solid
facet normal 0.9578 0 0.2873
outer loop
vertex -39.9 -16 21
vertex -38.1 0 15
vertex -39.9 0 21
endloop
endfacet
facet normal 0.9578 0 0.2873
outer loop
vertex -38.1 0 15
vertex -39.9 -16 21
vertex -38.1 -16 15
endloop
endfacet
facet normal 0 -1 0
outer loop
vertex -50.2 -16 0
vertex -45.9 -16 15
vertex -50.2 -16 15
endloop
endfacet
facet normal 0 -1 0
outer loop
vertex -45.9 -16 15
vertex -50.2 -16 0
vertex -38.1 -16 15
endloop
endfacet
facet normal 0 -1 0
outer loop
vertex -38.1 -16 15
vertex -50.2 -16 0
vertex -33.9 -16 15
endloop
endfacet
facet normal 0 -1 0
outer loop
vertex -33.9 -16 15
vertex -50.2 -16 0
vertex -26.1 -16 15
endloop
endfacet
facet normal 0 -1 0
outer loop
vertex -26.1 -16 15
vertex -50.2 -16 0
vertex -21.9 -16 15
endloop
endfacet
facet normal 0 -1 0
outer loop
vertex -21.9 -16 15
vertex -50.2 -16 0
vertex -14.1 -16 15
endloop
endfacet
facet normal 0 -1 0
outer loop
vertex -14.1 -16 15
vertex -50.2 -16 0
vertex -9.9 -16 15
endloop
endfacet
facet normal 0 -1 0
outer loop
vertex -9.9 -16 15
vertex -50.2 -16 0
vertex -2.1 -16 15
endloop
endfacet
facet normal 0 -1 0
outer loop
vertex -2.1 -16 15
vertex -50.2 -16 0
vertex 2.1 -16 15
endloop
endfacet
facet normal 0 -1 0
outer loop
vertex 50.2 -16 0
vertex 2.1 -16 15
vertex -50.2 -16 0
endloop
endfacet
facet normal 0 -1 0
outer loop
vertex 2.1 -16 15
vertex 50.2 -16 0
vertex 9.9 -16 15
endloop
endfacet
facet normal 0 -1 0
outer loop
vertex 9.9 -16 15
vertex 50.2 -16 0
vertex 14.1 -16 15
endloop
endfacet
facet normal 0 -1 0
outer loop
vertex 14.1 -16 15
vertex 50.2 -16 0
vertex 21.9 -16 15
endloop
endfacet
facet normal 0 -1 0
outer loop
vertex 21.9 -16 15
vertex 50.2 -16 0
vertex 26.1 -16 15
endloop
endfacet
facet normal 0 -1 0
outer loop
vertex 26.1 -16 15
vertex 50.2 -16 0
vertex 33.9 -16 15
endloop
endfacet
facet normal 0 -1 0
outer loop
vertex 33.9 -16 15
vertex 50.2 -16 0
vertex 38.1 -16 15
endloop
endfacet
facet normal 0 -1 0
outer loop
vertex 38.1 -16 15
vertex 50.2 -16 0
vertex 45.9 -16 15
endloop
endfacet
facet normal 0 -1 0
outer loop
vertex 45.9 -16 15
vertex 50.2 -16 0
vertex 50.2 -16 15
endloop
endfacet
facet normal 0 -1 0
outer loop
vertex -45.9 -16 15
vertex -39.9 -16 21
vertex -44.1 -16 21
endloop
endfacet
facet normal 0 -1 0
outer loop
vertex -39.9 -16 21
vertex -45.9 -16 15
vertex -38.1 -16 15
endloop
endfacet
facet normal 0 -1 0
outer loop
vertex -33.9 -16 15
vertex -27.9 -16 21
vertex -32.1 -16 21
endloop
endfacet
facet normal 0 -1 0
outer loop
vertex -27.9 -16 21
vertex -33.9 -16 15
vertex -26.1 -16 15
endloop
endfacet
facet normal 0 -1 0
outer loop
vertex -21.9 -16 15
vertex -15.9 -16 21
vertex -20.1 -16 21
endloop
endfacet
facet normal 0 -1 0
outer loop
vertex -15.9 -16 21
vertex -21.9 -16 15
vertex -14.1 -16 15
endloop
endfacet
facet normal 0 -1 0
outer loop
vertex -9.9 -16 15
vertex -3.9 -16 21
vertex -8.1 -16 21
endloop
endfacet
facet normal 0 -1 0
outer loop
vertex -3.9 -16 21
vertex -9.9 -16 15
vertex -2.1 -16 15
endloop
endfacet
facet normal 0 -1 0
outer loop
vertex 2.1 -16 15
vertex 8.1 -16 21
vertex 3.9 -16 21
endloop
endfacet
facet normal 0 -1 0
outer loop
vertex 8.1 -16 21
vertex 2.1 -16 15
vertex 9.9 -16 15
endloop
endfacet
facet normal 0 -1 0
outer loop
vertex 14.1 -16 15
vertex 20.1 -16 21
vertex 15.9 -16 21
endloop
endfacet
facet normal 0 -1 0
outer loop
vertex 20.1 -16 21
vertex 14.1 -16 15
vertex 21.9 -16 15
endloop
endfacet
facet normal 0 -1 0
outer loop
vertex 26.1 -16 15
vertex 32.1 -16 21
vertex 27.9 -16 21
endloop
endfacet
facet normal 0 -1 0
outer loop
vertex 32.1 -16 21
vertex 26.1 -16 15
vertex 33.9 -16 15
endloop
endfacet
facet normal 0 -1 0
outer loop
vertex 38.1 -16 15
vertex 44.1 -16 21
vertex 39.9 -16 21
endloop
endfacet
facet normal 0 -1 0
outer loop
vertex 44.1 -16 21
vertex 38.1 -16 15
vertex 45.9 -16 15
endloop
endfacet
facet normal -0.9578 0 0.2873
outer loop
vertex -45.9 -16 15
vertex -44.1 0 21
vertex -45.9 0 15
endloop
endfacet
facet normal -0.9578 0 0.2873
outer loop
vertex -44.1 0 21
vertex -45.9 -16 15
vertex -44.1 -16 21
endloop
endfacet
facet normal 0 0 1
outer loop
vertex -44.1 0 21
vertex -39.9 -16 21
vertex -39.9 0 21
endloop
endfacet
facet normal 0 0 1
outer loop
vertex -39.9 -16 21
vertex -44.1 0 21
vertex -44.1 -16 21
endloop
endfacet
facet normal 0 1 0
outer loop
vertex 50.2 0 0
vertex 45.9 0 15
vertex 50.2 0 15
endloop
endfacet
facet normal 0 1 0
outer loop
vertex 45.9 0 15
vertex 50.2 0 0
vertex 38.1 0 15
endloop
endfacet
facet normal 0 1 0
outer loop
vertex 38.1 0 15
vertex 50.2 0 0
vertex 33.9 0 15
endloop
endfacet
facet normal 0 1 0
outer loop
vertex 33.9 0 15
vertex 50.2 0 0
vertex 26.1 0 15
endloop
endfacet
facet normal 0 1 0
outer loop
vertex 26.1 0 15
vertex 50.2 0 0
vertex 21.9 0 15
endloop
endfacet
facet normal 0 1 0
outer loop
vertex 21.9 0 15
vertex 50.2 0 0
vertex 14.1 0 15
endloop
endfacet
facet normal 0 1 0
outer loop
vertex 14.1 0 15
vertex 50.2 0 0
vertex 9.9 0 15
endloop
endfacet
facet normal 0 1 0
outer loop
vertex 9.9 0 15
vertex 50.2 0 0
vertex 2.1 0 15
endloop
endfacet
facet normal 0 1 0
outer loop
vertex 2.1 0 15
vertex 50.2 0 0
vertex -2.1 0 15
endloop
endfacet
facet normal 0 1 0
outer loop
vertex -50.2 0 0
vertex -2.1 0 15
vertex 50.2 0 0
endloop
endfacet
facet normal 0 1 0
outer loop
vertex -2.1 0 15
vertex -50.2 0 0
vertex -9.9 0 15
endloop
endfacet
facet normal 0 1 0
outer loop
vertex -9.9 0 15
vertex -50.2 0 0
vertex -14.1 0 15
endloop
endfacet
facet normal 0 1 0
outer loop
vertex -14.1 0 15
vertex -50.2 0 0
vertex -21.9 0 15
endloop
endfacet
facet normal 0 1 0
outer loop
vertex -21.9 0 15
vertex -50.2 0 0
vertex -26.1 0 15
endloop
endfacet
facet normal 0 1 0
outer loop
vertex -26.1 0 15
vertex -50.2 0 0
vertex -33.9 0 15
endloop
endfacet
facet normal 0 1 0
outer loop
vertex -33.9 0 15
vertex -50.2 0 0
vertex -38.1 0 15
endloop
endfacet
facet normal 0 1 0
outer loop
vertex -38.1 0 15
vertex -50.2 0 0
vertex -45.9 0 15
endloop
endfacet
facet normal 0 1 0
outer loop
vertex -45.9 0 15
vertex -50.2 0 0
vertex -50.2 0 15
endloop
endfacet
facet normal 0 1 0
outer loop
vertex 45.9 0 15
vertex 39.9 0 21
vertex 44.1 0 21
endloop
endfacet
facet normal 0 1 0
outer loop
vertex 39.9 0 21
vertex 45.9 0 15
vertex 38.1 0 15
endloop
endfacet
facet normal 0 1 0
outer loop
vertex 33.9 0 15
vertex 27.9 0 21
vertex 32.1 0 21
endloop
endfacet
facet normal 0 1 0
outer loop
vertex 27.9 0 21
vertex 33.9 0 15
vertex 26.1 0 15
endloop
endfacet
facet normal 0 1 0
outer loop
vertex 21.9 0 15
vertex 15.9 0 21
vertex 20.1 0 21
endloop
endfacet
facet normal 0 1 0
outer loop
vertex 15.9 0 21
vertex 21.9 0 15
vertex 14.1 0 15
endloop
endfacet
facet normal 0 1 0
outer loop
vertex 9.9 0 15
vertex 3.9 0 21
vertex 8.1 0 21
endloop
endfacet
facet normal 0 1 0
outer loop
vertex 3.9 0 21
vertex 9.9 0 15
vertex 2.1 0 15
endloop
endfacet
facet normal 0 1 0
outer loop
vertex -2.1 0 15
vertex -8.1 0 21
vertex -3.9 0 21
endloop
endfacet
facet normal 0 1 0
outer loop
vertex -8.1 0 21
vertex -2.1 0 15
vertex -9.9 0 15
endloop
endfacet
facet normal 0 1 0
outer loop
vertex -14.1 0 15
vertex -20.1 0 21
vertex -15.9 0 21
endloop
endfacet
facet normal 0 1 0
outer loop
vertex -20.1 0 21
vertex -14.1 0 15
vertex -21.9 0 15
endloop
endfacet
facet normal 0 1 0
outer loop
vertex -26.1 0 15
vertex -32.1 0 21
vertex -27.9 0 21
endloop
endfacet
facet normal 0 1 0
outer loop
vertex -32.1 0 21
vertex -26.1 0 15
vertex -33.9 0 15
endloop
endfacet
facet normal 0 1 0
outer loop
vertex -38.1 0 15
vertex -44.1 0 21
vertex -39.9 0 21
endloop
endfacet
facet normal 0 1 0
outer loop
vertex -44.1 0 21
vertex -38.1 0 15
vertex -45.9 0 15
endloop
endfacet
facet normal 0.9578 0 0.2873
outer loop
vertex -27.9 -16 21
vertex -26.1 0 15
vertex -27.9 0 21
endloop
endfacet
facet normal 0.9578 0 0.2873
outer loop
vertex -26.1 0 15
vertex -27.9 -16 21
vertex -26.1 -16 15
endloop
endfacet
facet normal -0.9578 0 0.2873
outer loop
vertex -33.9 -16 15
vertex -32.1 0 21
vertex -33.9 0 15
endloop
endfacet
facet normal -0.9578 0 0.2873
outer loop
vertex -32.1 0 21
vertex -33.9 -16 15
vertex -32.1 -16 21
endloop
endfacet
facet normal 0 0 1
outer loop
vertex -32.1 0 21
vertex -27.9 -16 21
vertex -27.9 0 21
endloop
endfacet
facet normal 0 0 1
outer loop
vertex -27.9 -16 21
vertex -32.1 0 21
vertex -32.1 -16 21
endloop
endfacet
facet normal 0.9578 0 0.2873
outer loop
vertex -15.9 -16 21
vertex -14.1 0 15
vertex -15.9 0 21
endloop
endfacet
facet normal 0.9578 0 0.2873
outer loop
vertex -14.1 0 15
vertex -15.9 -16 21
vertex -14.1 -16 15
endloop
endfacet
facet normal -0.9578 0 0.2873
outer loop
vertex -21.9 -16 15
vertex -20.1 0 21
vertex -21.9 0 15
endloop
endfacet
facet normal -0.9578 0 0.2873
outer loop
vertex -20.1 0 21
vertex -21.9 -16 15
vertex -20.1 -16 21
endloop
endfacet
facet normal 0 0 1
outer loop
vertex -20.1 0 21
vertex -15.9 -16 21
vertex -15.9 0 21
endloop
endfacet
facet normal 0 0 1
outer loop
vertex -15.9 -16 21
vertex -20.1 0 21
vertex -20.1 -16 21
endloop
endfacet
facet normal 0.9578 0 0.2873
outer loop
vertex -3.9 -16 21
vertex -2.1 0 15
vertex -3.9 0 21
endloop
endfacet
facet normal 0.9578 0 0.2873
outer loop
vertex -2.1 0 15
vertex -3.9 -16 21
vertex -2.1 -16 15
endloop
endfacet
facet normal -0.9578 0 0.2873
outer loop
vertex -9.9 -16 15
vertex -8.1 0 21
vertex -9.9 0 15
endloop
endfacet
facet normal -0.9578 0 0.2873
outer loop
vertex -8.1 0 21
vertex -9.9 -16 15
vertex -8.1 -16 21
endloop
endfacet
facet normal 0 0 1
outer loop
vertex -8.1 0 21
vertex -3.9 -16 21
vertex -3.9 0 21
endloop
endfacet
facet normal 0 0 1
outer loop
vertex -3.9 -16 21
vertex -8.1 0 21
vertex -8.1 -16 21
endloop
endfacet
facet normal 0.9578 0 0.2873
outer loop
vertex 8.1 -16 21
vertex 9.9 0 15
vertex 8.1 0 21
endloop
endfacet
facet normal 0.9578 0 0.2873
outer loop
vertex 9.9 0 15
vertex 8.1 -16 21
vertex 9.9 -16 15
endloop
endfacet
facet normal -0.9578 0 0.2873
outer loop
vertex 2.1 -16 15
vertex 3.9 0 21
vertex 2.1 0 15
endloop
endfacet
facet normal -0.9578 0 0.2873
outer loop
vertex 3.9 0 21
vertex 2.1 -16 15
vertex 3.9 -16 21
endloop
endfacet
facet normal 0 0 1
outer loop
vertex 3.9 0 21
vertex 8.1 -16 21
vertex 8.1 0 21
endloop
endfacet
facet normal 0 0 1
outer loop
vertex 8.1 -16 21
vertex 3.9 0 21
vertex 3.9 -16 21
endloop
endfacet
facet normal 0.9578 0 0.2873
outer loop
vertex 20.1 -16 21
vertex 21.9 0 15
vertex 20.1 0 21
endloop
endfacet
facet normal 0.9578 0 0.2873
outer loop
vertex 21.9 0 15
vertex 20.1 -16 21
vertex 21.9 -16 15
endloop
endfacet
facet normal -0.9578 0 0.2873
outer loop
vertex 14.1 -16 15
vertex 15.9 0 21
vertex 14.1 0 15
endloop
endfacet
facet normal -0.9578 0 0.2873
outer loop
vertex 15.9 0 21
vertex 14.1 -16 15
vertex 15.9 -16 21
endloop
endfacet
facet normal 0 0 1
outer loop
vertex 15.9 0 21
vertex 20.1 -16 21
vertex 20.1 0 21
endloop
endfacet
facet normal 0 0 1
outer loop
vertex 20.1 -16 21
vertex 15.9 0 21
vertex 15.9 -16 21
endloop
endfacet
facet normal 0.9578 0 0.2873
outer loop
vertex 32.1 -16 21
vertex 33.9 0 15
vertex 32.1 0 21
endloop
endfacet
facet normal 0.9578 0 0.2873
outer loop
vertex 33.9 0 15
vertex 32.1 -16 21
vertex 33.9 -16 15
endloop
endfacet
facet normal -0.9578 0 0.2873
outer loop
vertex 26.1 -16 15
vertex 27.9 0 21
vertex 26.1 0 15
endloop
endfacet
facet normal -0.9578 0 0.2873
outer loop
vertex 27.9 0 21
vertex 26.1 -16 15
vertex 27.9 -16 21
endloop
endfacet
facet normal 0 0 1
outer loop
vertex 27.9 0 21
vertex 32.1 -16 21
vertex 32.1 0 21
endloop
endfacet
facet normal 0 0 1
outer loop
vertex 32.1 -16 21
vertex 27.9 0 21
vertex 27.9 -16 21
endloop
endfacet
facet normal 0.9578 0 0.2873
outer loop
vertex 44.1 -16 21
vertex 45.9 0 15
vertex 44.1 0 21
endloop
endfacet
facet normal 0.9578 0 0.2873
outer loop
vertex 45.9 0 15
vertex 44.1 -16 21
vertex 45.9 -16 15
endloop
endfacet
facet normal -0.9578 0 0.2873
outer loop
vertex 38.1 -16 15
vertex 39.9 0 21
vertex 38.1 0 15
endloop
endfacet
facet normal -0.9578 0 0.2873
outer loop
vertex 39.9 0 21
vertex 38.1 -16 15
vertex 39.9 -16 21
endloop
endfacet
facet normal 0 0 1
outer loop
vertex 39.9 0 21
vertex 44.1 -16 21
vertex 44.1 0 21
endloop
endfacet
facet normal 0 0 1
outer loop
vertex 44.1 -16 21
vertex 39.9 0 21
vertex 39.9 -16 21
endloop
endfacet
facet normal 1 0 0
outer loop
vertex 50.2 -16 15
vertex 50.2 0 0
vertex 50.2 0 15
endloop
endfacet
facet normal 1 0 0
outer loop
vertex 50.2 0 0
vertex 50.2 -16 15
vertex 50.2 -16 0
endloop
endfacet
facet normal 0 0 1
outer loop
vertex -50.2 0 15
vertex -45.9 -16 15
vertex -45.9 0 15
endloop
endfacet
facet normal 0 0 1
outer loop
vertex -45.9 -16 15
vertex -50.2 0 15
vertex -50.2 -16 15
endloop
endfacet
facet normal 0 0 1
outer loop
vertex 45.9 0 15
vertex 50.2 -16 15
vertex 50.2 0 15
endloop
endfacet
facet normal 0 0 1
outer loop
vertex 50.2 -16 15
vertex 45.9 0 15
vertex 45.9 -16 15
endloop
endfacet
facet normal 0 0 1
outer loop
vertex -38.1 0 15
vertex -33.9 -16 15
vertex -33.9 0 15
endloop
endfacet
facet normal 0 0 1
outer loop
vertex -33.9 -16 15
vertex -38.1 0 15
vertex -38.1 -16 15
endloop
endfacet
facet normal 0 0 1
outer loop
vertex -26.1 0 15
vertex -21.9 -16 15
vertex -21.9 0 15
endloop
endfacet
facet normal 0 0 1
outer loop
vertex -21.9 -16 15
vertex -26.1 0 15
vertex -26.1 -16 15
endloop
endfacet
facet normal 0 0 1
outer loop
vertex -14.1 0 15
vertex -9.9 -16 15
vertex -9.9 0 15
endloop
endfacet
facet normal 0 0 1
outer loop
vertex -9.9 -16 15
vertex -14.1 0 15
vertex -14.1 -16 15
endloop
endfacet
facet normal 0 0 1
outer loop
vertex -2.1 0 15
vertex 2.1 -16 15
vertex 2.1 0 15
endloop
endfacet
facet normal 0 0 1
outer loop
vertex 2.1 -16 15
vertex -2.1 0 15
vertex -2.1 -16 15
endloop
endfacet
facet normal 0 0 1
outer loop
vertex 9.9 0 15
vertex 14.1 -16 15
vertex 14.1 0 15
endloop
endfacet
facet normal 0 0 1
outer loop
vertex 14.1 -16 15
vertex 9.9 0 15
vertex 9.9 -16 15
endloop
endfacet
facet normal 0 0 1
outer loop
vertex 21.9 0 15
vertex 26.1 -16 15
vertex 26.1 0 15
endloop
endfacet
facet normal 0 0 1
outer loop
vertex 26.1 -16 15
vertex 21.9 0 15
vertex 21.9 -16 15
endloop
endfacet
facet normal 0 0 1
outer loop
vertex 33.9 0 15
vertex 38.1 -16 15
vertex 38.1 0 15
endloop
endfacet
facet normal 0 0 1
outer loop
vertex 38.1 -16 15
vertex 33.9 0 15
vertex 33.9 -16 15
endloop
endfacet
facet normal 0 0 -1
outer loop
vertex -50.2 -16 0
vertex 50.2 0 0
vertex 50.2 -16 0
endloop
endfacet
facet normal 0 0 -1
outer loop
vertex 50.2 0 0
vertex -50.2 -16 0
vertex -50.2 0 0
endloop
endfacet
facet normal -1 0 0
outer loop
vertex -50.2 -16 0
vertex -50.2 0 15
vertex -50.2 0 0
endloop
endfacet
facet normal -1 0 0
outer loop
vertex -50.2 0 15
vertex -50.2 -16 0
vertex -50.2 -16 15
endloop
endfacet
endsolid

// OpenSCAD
$fn = 32;

// ----------------------------------------------------------------------
// Toothed rack, 8 teeth
// 12 mm pitch, 6 mm teeth
// ----------------------------------------------------------------------

// --- parameters (mm) ---
bar_w = 16;     // bar width (Y)
bar_h = 15;     // bar height (Z)
teeth = 8;      // number of teeth
pitch = 12;     // tooth pitch
tooth_h = 6;    // tooth height above the bar
root_w = 8.4;   // tooth width at the root
crest_w = 4.2;  // tooth width at the crest

// --- derived feature positions (mm) ---
span = (teeth - 1) * pitch;  // = 84   distance between the outer teeth
bar_l = span + root_w + 8;   // = 100.4   bar length: teeth plus 4 mm at each end
tooth_x = -span / 2;         // = -42   X of the first tooth
height = bar_h + tooth_h;    // = 21   overall height
feature_centers = [
  [tooth_x + 0 * pitch, -bar_w / 2],
  [tooth_x + 1 * pitch, -bar_w / 2],
  [tooth_x + 2 * pitch, -bar_w / 2],
  [tooth_x + 3 * pitch, -bar_w / 2],
  [tooth_x + 4 * pitch, -bar_w / 2],
  [tooth_x + 5 * pitch, -bar_w / 2],
  [tooth_x + 6 * pitch, -bar_w / 2],
  [tooth_x + 7 * pitch, -bar_w / 2]
];   // tooth centre line, drives the tooth loop

// bar with a rack of teeth, one extruded trapezoium per centre
module rack_tooth() {
  linear_extrude(height = bar_w)
    polygon(points = [
      [0, 0],
      [root_w, 0],
      [root_w / 2 + crest_w / 2, tooth_h + 1],
      [root_w / 2 - crest_w / 2, tooth_h + 1]
    ]);
}

union() {
  translate([-bar_l / 2, -bar_w, 0]) cube([bar_l, bar_w, bar_h]);
  for (centre = feature_centers)
    translate([centre[0] - root_w / 2, 0, bar_h - 1]) rotate([90, 0, 0]) rack_tooth();
}
